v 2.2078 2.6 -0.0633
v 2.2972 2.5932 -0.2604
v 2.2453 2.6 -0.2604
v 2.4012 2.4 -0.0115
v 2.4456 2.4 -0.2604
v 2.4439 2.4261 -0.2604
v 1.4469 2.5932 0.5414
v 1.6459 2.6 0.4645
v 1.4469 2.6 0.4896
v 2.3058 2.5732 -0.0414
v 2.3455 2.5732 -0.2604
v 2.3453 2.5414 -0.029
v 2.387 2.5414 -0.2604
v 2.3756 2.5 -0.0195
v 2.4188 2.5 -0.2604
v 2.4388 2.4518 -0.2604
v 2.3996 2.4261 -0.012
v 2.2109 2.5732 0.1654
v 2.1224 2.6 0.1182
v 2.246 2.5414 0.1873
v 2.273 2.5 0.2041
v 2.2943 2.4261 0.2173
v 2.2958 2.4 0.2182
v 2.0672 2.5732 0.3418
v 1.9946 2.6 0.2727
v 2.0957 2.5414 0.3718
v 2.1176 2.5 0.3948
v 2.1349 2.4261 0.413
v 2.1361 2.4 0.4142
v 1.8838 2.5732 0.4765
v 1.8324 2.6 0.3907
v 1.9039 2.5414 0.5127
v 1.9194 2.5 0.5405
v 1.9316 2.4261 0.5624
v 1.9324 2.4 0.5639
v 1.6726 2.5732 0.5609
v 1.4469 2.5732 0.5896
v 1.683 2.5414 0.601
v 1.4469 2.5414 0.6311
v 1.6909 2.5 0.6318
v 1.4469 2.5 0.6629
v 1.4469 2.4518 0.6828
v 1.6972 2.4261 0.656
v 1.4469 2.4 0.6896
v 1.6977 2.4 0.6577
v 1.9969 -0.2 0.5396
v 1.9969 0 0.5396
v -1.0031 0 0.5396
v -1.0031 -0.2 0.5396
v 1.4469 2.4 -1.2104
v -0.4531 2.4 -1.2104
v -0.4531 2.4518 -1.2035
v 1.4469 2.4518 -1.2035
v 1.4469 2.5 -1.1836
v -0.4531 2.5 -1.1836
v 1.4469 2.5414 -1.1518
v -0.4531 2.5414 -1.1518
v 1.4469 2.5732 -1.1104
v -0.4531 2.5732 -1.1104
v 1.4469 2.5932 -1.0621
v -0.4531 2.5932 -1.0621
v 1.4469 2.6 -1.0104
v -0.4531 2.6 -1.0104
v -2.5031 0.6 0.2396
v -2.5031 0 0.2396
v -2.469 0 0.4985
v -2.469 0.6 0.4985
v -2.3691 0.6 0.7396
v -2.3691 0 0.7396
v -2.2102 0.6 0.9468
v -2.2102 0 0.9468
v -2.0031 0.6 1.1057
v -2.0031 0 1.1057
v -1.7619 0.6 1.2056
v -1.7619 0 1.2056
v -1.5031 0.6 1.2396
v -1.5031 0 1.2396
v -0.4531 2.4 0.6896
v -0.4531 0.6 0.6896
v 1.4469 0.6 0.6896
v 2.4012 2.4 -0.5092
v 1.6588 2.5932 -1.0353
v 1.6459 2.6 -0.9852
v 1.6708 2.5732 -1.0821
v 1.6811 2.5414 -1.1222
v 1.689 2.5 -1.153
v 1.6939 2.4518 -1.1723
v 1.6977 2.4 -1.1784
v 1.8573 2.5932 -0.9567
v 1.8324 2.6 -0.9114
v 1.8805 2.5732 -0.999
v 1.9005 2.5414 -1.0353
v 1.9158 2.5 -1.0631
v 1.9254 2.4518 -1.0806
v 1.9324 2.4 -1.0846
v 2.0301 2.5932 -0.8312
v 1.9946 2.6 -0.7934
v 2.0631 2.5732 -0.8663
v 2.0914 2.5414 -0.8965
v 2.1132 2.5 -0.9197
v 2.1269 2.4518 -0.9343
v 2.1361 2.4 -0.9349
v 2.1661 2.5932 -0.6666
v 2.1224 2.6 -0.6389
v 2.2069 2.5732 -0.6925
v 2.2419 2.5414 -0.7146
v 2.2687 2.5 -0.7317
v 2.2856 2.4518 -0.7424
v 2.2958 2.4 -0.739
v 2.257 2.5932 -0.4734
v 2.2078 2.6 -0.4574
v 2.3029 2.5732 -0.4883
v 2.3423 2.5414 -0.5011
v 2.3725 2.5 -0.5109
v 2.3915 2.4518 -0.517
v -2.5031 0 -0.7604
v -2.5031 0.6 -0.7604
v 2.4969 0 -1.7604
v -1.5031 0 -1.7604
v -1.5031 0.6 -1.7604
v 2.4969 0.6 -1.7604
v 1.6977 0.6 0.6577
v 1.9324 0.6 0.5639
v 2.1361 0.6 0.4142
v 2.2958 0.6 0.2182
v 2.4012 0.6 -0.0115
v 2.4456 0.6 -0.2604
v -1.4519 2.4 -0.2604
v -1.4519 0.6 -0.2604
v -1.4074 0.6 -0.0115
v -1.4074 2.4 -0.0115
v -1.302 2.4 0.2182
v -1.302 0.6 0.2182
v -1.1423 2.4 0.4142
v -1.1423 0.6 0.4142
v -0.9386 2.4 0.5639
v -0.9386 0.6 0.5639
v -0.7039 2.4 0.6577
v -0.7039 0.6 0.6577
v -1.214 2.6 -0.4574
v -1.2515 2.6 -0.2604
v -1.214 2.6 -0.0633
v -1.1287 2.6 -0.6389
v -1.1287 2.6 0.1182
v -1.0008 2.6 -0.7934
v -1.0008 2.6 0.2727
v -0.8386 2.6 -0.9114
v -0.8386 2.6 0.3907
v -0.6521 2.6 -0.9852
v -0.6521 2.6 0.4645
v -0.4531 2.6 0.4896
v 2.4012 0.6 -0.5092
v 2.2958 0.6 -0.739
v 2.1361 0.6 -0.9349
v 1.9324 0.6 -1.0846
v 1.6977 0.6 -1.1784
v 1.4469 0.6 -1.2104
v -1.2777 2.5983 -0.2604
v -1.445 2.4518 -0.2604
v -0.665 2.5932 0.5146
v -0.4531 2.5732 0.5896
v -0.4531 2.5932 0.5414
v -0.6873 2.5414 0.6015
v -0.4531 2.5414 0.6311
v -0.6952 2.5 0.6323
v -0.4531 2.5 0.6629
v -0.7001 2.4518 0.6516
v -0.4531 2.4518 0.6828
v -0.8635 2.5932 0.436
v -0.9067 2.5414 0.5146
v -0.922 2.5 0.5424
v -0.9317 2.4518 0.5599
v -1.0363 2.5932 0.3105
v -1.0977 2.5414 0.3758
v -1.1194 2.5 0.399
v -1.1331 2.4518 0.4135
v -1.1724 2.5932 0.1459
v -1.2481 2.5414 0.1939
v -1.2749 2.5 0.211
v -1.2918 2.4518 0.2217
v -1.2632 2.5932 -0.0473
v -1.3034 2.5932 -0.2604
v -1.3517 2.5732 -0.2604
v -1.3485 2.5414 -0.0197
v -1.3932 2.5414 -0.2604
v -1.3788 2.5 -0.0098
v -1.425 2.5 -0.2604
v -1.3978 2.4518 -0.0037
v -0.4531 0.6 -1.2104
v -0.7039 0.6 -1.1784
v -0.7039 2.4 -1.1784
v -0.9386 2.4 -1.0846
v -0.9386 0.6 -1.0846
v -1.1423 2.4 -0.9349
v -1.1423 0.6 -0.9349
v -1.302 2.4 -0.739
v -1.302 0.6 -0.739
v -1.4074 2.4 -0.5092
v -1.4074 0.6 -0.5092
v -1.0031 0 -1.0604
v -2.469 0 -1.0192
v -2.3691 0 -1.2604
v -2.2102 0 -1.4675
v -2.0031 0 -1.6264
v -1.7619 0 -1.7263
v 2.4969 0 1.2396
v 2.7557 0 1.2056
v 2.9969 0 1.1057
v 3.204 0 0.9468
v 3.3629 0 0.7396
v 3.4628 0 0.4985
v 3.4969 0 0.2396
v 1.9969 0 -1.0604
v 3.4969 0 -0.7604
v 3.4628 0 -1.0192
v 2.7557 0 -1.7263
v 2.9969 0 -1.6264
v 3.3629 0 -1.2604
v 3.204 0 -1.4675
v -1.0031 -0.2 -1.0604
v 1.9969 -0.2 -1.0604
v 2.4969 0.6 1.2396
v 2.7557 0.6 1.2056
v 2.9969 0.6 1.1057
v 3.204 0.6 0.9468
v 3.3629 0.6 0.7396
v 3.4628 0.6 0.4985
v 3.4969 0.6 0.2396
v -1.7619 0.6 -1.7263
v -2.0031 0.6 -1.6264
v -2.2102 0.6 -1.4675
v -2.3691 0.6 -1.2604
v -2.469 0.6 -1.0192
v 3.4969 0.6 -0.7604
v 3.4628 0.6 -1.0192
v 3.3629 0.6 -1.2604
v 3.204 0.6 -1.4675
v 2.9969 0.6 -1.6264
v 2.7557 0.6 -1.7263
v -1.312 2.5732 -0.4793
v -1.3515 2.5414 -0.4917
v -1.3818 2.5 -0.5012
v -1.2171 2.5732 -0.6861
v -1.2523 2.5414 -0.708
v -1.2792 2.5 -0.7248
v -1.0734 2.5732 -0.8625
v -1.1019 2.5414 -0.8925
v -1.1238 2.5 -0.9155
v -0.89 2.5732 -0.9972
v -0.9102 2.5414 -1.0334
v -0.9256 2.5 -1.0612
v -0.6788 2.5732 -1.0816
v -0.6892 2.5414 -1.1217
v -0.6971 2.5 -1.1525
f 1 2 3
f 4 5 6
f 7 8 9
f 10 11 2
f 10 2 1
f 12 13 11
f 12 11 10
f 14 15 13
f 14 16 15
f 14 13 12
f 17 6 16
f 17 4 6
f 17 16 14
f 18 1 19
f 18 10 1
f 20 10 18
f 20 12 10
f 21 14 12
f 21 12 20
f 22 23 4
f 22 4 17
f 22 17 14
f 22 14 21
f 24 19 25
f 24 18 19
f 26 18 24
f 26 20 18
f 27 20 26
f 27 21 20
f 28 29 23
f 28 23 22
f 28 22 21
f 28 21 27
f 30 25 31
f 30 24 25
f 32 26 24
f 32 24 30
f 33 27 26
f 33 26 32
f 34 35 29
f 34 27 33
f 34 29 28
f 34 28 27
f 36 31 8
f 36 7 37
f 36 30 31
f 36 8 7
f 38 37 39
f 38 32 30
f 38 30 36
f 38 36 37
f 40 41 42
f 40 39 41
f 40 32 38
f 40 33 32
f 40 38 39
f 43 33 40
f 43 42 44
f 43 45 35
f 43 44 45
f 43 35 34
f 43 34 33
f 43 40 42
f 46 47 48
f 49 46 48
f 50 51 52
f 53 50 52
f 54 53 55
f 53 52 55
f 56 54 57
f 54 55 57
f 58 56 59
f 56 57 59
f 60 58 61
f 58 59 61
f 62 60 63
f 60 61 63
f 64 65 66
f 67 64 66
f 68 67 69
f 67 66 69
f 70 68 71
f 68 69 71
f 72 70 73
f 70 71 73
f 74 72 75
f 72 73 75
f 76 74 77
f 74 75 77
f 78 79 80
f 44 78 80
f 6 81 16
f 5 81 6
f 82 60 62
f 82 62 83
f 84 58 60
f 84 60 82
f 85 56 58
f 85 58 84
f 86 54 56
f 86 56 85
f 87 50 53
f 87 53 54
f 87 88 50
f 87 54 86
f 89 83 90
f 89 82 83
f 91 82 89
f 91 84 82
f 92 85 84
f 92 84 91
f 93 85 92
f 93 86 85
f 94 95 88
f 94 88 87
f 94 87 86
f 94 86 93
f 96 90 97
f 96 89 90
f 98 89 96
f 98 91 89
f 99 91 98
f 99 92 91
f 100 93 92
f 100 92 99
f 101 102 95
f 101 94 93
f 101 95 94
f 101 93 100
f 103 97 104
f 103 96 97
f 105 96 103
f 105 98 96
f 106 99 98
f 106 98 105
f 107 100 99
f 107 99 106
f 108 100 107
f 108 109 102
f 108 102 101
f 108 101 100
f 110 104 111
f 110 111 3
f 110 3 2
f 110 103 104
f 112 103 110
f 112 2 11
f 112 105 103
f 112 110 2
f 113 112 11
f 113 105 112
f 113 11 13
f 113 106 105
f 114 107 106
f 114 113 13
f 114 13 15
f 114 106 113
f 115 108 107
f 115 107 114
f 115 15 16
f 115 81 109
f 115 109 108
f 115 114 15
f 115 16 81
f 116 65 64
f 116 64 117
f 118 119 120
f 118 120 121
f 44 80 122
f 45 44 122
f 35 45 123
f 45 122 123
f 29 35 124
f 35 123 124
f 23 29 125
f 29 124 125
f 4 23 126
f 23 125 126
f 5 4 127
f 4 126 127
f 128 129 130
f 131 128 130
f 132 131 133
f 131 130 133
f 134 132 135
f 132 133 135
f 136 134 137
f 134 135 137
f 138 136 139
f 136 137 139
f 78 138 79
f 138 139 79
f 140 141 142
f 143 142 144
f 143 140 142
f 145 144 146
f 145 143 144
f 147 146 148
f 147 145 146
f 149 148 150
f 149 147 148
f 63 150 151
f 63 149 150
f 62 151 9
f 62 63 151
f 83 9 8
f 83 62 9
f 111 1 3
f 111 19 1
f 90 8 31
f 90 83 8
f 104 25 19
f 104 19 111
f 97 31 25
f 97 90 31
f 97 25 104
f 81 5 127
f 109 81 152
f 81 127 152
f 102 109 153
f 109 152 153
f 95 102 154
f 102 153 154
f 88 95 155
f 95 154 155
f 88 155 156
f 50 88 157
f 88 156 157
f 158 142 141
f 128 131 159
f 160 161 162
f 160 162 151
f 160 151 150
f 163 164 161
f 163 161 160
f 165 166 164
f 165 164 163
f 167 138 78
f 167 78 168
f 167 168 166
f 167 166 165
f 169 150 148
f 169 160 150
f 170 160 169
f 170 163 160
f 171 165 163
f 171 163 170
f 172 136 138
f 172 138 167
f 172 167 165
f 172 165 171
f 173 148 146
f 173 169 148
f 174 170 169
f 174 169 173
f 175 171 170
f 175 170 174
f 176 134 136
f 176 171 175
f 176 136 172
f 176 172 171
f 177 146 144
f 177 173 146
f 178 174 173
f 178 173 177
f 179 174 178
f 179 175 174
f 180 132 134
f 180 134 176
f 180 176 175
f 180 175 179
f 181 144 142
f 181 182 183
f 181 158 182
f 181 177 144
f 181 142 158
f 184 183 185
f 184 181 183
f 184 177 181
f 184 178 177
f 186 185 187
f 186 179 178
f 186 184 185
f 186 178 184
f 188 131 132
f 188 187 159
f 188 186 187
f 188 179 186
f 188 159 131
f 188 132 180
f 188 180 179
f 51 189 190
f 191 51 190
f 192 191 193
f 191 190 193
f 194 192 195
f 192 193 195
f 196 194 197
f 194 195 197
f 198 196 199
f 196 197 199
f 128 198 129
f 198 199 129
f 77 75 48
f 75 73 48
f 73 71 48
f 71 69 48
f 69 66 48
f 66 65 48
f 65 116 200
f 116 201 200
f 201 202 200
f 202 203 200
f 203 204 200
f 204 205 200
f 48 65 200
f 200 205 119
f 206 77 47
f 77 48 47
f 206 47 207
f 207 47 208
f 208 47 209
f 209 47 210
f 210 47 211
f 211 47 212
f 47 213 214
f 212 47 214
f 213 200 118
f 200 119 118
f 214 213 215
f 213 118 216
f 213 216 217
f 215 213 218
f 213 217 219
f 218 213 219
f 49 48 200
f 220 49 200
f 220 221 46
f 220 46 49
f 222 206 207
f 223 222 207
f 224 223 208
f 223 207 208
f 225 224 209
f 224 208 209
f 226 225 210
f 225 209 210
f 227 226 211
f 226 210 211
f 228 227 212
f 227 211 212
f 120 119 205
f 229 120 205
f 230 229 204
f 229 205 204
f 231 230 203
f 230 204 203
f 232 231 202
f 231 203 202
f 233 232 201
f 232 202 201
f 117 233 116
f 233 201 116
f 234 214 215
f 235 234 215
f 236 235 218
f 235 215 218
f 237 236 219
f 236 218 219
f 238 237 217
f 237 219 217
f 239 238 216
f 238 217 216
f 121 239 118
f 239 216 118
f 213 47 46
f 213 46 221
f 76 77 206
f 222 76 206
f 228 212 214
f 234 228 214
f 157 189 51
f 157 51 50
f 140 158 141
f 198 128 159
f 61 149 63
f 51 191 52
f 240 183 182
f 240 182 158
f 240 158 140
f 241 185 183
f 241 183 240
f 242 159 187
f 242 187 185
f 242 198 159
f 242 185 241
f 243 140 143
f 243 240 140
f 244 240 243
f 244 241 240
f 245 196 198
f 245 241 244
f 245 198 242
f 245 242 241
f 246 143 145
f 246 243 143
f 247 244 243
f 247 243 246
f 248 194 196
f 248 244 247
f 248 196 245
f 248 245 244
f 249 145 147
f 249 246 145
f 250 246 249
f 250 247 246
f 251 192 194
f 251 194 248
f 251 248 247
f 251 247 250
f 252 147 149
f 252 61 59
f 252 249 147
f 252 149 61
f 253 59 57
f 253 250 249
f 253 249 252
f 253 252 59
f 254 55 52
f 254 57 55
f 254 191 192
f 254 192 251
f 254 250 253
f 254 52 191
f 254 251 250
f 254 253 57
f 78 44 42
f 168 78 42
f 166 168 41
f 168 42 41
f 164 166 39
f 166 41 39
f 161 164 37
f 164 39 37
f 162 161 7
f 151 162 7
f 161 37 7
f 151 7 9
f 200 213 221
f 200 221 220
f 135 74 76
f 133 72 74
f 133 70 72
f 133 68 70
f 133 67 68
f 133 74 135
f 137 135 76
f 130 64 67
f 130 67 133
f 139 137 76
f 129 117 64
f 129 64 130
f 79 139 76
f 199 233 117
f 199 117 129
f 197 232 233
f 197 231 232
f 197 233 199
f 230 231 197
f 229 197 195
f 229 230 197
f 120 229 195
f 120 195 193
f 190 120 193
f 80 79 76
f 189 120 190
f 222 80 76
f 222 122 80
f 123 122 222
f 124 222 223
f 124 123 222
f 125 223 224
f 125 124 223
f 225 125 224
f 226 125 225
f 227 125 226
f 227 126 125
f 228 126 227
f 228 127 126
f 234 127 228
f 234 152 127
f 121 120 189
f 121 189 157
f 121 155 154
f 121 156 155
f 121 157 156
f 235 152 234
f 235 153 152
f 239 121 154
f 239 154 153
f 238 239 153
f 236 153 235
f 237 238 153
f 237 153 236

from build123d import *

# Parameters (mm, degrees)
SKETCH_1_W      = 6
SKETCH_1_H      = 3
EXTRUDE_1_DEPTH = 0.6
SKETCH_2_W      = 3.9
SKETCH_2_H      = 1.9
EXTRUDE_2_DEPTH = 2
FILLET_1_R      = 1
SKETCH_3_W      = 3
SKETCH_3_H      = 1.6
EXTRUDE_3_DEPTH = 0.2
FILLET_2_R      = 0.2


with BuildPart() as part:
    # 草图1 → 凸台-拉伸1 (new body)
    with BuildSketch(Plane(origin=(0, 0, 0), x_dir=(1, 0, 0), z_dir=(0, 1, 0))):
        with Locations((0.496893044, 0.260354793)):
            Rectangle(SKETCH_1_W, SKETCH_1_H)
    extrude(amount=EXTRUDE_1_DEPTH)

    # 草图2 → 凸台-拉伸2 (add)
    with BuildSketch(Plane(origin=(0, 0.6, 0), x_dir=(1, 0, 0), z_dir=(0, 1, 0))):
        with Locations((0.496893044, 0.260354793)):
            Rectangle(SKETCH_2_W, SKETCH_2_H)
    extrude(amount=EXTRUDE_2_DEPTH)

    # 圆角1
    # the kernel refuses this fillet: 1 mm, written as the material it takes off along each edge
    with BuildSketch(Plane(origin=(3.496893044, -2.5, -1.760354793), x_dir=(-1, 0, 0), z_dir=(0, 1, 0)), Plane(origin=(3.496893044, -2.5, 1.239645207), x_dir=(0, 0, -1), z_dir=(0, 1, 0))) as fillet_1_piece_1:
        with BuildLine():
            CenterArc((FILLET_1_R, FILLET_1_R), FILLET_1_R, 180, 90)
            Line((0, FILLET_1_R), (0, 0))
            Line((0, 0), (FILLET_1_R, 0))
        make_face()
    extrude(amount=5.6, mode=Mode.SUBTRACT)
    with BuildSketch(Plane(origin=(-2.503106956, -2.5, -1.760354793), x_dir=(1, 0, 0), z_dir=(0, 1, 0)), Plane(origin=(-2.503106956, -2.5, 1.239645207), x_dir=(0, 0, -1), z_dir=(0, 1, 0))) as fillet_1_piece_2:
        with BuildLine():
            CenterArc((FILLET_1_R, -FILLET_1_R), FILLET_1_R, 90, 90)
            Line((0, -FILLET_1_R), (0, 0))
            Line((0, 0), (FILLET_1_R, 0))
        make_face()
    extrude(amount=5.6, mode=Mode.SUBTRACT)
    with BuildSketch(Plane(origin=(2.446893044, 0.6, -1.210354793), x_dir=(-1, 0, 0), z_dir=(0, 1, 0)), Plane(origin=(-1.453106956, 0.6, 0.689645207), x_dir=(1, 0, 0), z_dir=(0, 1, 0)), Plane(origin=(2.446893044, 0.6, 0.689645207), x_dir=(0, 0, -1), z_dir=(0, 1, 0))) as fillet_1_piece_3:
        with BuildLine():
            CenterArc((FILLET_1_R, FILLET_1_R), FILLET_1_R, 180, 90)
            Line((0, FILLET_1_R), (0, 0))
            Line((0, 0), (FILLET_1_R, 0))
        make_face()
    extrude(amount=4.5, mode=Mode.SUBTRACT)
    with BuildSketch(Plane(origin=(-1.453106956, 0.6, -1.210354793), x_dir=(1, 0, 0), z_dir=(0, 1, 0))) as fillet_1_piece_4:
        with BuildLine():
            CenterArc((FILLET_1_R, -FILLET_1_R), FILLET_1_R, 90, 90)
            Line((0, -FILLET_1_R), (0, 0))
            Line((0, 0), (FILLET_1_R, 0))
        make_face()
    extrude(amount=4.5, mode=Mode.SUBTRACT)

    # 草图3 → 凸台-拉伸3 (add)
    with BuildSketch(Plane(origin=(0, 0, 0), x_dir=(-1, 0, 0), z_dir=(0, -1, 0))):
        with Locations((-0.496893044, 0.260354793)):
            Rectangle(SKETCH_3_W, SKETCH_3_H)
    extrude(amount=EXTRUDE_3_DEPTH)

    # 圆角2
    # the kernel refuses this fillet: 0.2 mm, written as the material it takes off along each edge
    with BuildSketch(Plane(origin=(-0.453106956, 2.6, -1.210354793), x_dir=(0, -1, 0), z_dir=(1, 0, 0)), Plane(origin=(1.446893044, 2.6, 0.689645207), x_dir=(0, -1, 0), z_dir=(-1, 0, 0))) as fillet_2_piece_1:
        with BuildLine():
            CenterArc((FILLET_2_R, -FILLET_2_R), FILLET_2_R, 90, 90)
            Line((0, -FILLET_2_R), (0, 0))
            Line((0, 0), (FILLET_2_R, 0))
        make_face()
    extrude(amount=1.9, mode=Mode.SUBTRACT)
    with BuildSketch(Plane(origin=(1.446893044, 2.6, -0.310354793), x_dir=(0.900374274099907, 0, -0.4351162678400631), z_dir=(-0.4351162678400631, 0, -0.900374274099907))) as fillet_2_piece_2:
        with BuildLine():
            CenterArc((1 - FILLET_2_R, FILLET_2_R), FILLET_2_R, 270, 90)
            Line((1 - FILLET_2_R, 0), (1, 0))
            Line((1, 0), (1, FILLET_2_R))
        make_face()
    revolve(axis=Axis((1.446893044, 2.6, -0.310354793), (0, -1, 0)), revolution_arc=115.792692411, mode=Mode.SUBTRACT)
    with BuildSketch(Plane(origin=(1.446893044, 2.6, -0.210354793), x_dir=(0, 0, -1), z_dir=(-1, 0, 0))) as fillet_2_piece_3:
        with BuildLine():
            CenterArc((1 - FILLET_2_R, FILLET_2_R), FILLET_2_R, 270, 90)
            Line((1 - FILLET_2_R, 0), (1, 0))
            Line((1, 0), (1, FILLET_2_R))
        make_face()
    revolve(axis=Axis((1.446893044, 2.6, -0.210354793), (0, -1, 0)), revolution_arc=115.792692411, mode=Mode.SUBTRACT)
    with BuildSketch(Plane(origin=(-0.453106956, 2.6, -0.310354793), x_dir=(0, 0, 1), z_dir=(1, 0, 0))) as fillet_2_piece_4:
        with BuildLine():
            CenterArc((1 - FILLET_2_R, FILLET_2_R), FILLET_2_R, 270, 90)
            Line((1 - FILLET_2_R, 0), (1, 0))
            Line((1, 0), (1, FILLET_2_R))
        make_face()
    revolve(axis=Axis((-0.453106956, 2.6, -0.310354793), (0, -1, 0)), revolution_arc=115.792692411, mode=Mode.SUBTRACT)
    with BuildSketch(Plane(origin=(-0.453106956, 2.6, -0.210354793), x_dir=(-0.9003742740999057, 0, 0.43511626784006596), z_dir=(0.43511626784006596, 0, 0.9003742740999057))) as fillet_2_piece_5:
        with BuildLine():
            CenterArc((1 - FILLET_2_R, FILLET_2_R), FILLET_2_R, 270, 90)
            Line((1 - FILLET_2_R, 0), (1, 0))
            Line((1, 0), (1, FILLET_2_R))
        make_face()
    revolve(axis=Axis((-0.453106956, 2.6, -0.210354793), (0, -1, 0)), revolution_arc=115.792692411, mode=Mode.SUBTRACT)


solid = part.part
